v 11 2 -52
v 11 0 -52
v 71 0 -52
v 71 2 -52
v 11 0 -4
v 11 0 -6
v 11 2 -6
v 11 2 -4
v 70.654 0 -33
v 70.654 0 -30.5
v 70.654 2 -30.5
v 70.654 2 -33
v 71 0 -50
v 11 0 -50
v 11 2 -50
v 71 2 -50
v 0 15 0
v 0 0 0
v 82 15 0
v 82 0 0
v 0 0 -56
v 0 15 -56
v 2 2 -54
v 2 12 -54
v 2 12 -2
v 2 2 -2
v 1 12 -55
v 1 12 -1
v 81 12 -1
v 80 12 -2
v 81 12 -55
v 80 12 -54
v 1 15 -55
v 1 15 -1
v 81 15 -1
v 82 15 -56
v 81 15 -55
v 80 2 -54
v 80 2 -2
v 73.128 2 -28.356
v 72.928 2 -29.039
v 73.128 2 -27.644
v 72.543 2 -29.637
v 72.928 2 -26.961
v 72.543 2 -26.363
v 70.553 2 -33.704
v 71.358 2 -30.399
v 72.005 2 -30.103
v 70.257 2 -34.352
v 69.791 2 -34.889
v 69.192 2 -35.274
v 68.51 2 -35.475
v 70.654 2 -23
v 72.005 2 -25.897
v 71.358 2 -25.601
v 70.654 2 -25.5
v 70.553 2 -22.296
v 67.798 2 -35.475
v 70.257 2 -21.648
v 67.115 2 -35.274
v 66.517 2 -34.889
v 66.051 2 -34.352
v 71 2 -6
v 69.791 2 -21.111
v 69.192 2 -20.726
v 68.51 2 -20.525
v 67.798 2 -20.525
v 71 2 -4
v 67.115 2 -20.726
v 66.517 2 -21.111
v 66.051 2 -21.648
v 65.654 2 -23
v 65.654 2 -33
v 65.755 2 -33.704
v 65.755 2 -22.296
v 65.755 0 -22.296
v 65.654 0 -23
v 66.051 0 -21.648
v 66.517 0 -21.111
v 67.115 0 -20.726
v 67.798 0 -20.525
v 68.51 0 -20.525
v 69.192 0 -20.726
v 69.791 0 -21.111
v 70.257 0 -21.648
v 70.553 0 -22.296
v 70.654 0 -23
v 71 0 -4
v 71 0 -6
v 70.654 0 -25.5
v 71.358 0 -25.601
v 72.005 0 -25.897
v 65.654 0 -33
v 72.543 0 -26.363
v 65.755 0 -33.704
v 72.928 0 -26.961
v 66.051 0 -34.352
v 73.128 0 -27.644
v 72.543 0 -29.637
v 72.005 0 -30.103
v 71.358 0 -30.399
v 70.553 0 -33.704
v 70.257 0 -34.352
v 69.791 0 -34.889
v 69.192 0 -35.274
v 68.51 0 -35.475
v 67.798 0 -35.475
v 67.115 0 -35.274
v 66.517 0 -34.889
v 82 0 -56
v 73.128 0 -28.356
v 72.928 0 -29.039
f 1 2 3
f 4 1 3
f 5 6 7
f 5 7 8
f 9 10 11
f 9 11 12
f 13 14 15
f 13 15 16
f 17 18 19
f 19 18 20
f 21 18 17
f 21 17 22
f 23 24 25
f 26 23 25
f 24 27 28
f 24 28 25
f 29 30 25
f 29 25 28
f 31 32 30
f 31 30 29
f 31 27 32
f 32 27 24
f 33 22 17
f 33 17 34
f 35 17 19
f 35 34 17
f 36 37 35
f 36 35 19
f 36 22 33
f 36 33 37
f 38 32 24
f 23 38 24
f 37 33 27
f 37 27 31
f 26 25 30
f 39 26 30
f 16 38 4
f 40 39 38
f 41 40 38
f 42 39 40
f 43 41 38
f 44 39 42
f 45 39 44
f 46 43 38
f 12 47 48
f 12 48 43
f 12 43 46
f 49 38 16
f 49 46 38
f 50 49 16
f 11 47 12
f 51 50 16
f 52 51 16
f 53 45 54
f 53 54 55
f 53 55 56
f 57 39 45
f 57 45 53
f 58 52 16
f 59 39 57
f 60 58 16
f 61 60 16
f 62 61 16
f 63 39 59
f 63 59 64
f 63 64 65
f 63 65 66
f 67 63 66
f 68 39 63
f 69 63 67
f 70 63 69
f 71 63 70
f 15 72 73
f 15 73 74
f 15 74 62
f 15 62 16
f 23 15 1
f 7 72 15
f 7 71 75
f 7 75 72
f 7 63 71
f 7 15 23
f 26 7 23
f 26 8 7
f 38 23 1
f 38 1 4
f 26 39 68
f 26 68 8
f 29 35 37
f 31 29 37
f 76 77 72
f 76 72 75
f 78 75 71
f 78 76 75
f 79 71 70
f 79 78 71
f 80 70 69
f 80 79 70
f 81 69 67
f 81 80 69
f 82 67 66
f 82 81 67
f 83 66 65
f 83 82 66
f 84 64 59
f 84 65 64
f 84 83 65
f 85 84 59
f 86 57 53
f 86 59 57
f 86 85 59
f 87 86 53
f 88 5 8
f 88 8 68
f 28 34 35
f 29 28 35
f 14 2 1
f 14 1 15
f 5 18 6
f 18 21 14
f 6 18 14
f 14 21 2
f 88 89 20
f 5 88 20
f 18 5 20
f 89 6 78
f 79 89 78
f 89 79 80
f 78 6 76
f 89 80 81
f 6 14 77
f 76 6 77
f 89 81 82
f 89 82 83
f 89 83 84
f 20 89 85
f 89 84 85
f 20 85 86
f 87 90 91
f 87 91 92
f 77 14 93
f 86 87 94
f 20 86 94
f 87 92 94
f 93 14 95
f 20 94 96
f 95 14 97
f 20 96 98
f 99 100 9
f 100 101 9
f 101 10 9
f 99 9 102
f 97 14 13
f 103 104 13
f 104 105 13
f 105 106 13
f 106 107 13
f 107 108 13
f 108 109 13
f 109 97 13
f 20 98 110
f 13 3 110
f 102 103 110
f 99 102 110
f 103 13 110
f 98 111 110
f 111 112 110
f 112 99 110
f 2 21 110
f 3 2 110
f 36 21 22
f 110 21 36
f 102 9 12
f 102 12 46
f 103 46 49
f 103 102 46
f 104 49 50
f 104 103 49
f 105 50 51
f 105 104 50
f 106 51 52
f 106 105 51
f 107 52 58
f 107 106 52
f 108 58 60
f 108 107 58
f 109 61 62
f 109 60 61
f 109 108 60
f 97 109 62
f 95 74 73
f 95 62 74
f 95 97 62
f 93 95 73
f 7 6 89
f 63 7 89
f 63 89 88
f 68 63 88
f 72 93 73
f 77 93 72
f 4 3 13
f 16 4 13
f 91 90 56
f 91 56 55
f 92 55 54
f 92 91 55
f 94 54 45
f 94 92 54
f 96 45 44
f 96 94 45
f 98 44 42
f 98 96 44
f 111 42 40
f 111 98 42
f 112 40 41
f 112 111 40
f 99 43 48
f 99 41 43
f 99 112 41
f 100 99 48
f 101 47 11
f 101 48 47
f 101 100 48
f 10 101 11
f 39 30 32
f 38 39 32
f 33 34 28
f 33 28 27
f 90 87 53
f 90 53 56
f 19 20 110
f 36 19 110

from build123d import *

# Parameters (mm, degrees)
SKETCH1_W           = 82
SKETCH1_H           = 56
BOSS_EXTRUDE1_DEPTH = 15
SKETCH3_W           = 80
SKETCH3_H           = 54
CUT_EXTRUDE1_DEPTH  = 3
CUT_EXTRUDE2_DEPTH  = 10
SKETCH5_W           = 60
SKETCH5_H           = 2
CUT_EXTRUDE3_DEPTH  = 11


with BuildPart() as part:
    # Sketch1 → Boss-Extrude1 (new body)
    with BuildSketch(Plane(origin=(0, 0, 0), x_dir=(1, 0, 0), z_dir=(0, 1, 0))):
        with Locations((41, 28)):
            Rectangle(SKETCH1_W, SKETCH1_H)
    extrude(amount=BOSS_EXTRUDE1_DEPTH)

    # Sketch3 → Cut-Extrude1 (cut)
    with BuildSketch(Plane(origin=(0, 15, 0), x_dir=(1, 0, 0), z_dir=(0, 1, 0))):
        with Locations((41, 28)):
            Rectangle(SKETCH3_W, SKETCH3_H)
    extrude(amount=-CUT_EXTRUDE1_DEPTH, mode=Mode.SUBTRACT)

    # 3DSketch1 → Cut-Extrude2 (cut)
    with BuildSketch(Plane(origin=(80, 12, -2), x_dir=(-0.8320502943378438, 0, -0.554700196225229), z_dir=(0, 1, 0))):
        Polygon((0, 0), (28.844410204, -43.266615306), (93.744333162, 0), (64.899922958, 43.266615306), align=None)
    extrude(amount=-CUT_EXTRUDE2_DEPTH, mode=Mode.SUBTRACT)

    # Sketch5 → Cut-Extrude3 (cut)
    with BuildSketch(Plane.XZ):
        with Locations((41, -5)):
            Rectangle(SKETCH5_W, SKETCH5_H)
        with Locations((41, -51)):
            Rectangle(SKETCH5_W, SKETCH5_H)
        with BuildLine():
            Line((70.653805937, -23), (70.653805937, -25.5))
            ThreePointArc((70.653805937, -25.5), (73.153805937, -28), (70.653805937, -30.5))
            Line((70.653805937, -30.5), (70.653805937, -33))
            ThreePointArc((70.653805937, -33), (68.153805937, -35.5), (65.653805937, -33))
            Line((65.653805937, -33), (65.653805937, -23))
            ThreePointArc((65.653805937, -23), (68.153805937, -20.5), (70.653805937, -23))
        make_face()
    extrude(amount=-CUT_EXTRUDE3_DEPTH, mode=Mode.SUBTRACT)


solid = part.part
